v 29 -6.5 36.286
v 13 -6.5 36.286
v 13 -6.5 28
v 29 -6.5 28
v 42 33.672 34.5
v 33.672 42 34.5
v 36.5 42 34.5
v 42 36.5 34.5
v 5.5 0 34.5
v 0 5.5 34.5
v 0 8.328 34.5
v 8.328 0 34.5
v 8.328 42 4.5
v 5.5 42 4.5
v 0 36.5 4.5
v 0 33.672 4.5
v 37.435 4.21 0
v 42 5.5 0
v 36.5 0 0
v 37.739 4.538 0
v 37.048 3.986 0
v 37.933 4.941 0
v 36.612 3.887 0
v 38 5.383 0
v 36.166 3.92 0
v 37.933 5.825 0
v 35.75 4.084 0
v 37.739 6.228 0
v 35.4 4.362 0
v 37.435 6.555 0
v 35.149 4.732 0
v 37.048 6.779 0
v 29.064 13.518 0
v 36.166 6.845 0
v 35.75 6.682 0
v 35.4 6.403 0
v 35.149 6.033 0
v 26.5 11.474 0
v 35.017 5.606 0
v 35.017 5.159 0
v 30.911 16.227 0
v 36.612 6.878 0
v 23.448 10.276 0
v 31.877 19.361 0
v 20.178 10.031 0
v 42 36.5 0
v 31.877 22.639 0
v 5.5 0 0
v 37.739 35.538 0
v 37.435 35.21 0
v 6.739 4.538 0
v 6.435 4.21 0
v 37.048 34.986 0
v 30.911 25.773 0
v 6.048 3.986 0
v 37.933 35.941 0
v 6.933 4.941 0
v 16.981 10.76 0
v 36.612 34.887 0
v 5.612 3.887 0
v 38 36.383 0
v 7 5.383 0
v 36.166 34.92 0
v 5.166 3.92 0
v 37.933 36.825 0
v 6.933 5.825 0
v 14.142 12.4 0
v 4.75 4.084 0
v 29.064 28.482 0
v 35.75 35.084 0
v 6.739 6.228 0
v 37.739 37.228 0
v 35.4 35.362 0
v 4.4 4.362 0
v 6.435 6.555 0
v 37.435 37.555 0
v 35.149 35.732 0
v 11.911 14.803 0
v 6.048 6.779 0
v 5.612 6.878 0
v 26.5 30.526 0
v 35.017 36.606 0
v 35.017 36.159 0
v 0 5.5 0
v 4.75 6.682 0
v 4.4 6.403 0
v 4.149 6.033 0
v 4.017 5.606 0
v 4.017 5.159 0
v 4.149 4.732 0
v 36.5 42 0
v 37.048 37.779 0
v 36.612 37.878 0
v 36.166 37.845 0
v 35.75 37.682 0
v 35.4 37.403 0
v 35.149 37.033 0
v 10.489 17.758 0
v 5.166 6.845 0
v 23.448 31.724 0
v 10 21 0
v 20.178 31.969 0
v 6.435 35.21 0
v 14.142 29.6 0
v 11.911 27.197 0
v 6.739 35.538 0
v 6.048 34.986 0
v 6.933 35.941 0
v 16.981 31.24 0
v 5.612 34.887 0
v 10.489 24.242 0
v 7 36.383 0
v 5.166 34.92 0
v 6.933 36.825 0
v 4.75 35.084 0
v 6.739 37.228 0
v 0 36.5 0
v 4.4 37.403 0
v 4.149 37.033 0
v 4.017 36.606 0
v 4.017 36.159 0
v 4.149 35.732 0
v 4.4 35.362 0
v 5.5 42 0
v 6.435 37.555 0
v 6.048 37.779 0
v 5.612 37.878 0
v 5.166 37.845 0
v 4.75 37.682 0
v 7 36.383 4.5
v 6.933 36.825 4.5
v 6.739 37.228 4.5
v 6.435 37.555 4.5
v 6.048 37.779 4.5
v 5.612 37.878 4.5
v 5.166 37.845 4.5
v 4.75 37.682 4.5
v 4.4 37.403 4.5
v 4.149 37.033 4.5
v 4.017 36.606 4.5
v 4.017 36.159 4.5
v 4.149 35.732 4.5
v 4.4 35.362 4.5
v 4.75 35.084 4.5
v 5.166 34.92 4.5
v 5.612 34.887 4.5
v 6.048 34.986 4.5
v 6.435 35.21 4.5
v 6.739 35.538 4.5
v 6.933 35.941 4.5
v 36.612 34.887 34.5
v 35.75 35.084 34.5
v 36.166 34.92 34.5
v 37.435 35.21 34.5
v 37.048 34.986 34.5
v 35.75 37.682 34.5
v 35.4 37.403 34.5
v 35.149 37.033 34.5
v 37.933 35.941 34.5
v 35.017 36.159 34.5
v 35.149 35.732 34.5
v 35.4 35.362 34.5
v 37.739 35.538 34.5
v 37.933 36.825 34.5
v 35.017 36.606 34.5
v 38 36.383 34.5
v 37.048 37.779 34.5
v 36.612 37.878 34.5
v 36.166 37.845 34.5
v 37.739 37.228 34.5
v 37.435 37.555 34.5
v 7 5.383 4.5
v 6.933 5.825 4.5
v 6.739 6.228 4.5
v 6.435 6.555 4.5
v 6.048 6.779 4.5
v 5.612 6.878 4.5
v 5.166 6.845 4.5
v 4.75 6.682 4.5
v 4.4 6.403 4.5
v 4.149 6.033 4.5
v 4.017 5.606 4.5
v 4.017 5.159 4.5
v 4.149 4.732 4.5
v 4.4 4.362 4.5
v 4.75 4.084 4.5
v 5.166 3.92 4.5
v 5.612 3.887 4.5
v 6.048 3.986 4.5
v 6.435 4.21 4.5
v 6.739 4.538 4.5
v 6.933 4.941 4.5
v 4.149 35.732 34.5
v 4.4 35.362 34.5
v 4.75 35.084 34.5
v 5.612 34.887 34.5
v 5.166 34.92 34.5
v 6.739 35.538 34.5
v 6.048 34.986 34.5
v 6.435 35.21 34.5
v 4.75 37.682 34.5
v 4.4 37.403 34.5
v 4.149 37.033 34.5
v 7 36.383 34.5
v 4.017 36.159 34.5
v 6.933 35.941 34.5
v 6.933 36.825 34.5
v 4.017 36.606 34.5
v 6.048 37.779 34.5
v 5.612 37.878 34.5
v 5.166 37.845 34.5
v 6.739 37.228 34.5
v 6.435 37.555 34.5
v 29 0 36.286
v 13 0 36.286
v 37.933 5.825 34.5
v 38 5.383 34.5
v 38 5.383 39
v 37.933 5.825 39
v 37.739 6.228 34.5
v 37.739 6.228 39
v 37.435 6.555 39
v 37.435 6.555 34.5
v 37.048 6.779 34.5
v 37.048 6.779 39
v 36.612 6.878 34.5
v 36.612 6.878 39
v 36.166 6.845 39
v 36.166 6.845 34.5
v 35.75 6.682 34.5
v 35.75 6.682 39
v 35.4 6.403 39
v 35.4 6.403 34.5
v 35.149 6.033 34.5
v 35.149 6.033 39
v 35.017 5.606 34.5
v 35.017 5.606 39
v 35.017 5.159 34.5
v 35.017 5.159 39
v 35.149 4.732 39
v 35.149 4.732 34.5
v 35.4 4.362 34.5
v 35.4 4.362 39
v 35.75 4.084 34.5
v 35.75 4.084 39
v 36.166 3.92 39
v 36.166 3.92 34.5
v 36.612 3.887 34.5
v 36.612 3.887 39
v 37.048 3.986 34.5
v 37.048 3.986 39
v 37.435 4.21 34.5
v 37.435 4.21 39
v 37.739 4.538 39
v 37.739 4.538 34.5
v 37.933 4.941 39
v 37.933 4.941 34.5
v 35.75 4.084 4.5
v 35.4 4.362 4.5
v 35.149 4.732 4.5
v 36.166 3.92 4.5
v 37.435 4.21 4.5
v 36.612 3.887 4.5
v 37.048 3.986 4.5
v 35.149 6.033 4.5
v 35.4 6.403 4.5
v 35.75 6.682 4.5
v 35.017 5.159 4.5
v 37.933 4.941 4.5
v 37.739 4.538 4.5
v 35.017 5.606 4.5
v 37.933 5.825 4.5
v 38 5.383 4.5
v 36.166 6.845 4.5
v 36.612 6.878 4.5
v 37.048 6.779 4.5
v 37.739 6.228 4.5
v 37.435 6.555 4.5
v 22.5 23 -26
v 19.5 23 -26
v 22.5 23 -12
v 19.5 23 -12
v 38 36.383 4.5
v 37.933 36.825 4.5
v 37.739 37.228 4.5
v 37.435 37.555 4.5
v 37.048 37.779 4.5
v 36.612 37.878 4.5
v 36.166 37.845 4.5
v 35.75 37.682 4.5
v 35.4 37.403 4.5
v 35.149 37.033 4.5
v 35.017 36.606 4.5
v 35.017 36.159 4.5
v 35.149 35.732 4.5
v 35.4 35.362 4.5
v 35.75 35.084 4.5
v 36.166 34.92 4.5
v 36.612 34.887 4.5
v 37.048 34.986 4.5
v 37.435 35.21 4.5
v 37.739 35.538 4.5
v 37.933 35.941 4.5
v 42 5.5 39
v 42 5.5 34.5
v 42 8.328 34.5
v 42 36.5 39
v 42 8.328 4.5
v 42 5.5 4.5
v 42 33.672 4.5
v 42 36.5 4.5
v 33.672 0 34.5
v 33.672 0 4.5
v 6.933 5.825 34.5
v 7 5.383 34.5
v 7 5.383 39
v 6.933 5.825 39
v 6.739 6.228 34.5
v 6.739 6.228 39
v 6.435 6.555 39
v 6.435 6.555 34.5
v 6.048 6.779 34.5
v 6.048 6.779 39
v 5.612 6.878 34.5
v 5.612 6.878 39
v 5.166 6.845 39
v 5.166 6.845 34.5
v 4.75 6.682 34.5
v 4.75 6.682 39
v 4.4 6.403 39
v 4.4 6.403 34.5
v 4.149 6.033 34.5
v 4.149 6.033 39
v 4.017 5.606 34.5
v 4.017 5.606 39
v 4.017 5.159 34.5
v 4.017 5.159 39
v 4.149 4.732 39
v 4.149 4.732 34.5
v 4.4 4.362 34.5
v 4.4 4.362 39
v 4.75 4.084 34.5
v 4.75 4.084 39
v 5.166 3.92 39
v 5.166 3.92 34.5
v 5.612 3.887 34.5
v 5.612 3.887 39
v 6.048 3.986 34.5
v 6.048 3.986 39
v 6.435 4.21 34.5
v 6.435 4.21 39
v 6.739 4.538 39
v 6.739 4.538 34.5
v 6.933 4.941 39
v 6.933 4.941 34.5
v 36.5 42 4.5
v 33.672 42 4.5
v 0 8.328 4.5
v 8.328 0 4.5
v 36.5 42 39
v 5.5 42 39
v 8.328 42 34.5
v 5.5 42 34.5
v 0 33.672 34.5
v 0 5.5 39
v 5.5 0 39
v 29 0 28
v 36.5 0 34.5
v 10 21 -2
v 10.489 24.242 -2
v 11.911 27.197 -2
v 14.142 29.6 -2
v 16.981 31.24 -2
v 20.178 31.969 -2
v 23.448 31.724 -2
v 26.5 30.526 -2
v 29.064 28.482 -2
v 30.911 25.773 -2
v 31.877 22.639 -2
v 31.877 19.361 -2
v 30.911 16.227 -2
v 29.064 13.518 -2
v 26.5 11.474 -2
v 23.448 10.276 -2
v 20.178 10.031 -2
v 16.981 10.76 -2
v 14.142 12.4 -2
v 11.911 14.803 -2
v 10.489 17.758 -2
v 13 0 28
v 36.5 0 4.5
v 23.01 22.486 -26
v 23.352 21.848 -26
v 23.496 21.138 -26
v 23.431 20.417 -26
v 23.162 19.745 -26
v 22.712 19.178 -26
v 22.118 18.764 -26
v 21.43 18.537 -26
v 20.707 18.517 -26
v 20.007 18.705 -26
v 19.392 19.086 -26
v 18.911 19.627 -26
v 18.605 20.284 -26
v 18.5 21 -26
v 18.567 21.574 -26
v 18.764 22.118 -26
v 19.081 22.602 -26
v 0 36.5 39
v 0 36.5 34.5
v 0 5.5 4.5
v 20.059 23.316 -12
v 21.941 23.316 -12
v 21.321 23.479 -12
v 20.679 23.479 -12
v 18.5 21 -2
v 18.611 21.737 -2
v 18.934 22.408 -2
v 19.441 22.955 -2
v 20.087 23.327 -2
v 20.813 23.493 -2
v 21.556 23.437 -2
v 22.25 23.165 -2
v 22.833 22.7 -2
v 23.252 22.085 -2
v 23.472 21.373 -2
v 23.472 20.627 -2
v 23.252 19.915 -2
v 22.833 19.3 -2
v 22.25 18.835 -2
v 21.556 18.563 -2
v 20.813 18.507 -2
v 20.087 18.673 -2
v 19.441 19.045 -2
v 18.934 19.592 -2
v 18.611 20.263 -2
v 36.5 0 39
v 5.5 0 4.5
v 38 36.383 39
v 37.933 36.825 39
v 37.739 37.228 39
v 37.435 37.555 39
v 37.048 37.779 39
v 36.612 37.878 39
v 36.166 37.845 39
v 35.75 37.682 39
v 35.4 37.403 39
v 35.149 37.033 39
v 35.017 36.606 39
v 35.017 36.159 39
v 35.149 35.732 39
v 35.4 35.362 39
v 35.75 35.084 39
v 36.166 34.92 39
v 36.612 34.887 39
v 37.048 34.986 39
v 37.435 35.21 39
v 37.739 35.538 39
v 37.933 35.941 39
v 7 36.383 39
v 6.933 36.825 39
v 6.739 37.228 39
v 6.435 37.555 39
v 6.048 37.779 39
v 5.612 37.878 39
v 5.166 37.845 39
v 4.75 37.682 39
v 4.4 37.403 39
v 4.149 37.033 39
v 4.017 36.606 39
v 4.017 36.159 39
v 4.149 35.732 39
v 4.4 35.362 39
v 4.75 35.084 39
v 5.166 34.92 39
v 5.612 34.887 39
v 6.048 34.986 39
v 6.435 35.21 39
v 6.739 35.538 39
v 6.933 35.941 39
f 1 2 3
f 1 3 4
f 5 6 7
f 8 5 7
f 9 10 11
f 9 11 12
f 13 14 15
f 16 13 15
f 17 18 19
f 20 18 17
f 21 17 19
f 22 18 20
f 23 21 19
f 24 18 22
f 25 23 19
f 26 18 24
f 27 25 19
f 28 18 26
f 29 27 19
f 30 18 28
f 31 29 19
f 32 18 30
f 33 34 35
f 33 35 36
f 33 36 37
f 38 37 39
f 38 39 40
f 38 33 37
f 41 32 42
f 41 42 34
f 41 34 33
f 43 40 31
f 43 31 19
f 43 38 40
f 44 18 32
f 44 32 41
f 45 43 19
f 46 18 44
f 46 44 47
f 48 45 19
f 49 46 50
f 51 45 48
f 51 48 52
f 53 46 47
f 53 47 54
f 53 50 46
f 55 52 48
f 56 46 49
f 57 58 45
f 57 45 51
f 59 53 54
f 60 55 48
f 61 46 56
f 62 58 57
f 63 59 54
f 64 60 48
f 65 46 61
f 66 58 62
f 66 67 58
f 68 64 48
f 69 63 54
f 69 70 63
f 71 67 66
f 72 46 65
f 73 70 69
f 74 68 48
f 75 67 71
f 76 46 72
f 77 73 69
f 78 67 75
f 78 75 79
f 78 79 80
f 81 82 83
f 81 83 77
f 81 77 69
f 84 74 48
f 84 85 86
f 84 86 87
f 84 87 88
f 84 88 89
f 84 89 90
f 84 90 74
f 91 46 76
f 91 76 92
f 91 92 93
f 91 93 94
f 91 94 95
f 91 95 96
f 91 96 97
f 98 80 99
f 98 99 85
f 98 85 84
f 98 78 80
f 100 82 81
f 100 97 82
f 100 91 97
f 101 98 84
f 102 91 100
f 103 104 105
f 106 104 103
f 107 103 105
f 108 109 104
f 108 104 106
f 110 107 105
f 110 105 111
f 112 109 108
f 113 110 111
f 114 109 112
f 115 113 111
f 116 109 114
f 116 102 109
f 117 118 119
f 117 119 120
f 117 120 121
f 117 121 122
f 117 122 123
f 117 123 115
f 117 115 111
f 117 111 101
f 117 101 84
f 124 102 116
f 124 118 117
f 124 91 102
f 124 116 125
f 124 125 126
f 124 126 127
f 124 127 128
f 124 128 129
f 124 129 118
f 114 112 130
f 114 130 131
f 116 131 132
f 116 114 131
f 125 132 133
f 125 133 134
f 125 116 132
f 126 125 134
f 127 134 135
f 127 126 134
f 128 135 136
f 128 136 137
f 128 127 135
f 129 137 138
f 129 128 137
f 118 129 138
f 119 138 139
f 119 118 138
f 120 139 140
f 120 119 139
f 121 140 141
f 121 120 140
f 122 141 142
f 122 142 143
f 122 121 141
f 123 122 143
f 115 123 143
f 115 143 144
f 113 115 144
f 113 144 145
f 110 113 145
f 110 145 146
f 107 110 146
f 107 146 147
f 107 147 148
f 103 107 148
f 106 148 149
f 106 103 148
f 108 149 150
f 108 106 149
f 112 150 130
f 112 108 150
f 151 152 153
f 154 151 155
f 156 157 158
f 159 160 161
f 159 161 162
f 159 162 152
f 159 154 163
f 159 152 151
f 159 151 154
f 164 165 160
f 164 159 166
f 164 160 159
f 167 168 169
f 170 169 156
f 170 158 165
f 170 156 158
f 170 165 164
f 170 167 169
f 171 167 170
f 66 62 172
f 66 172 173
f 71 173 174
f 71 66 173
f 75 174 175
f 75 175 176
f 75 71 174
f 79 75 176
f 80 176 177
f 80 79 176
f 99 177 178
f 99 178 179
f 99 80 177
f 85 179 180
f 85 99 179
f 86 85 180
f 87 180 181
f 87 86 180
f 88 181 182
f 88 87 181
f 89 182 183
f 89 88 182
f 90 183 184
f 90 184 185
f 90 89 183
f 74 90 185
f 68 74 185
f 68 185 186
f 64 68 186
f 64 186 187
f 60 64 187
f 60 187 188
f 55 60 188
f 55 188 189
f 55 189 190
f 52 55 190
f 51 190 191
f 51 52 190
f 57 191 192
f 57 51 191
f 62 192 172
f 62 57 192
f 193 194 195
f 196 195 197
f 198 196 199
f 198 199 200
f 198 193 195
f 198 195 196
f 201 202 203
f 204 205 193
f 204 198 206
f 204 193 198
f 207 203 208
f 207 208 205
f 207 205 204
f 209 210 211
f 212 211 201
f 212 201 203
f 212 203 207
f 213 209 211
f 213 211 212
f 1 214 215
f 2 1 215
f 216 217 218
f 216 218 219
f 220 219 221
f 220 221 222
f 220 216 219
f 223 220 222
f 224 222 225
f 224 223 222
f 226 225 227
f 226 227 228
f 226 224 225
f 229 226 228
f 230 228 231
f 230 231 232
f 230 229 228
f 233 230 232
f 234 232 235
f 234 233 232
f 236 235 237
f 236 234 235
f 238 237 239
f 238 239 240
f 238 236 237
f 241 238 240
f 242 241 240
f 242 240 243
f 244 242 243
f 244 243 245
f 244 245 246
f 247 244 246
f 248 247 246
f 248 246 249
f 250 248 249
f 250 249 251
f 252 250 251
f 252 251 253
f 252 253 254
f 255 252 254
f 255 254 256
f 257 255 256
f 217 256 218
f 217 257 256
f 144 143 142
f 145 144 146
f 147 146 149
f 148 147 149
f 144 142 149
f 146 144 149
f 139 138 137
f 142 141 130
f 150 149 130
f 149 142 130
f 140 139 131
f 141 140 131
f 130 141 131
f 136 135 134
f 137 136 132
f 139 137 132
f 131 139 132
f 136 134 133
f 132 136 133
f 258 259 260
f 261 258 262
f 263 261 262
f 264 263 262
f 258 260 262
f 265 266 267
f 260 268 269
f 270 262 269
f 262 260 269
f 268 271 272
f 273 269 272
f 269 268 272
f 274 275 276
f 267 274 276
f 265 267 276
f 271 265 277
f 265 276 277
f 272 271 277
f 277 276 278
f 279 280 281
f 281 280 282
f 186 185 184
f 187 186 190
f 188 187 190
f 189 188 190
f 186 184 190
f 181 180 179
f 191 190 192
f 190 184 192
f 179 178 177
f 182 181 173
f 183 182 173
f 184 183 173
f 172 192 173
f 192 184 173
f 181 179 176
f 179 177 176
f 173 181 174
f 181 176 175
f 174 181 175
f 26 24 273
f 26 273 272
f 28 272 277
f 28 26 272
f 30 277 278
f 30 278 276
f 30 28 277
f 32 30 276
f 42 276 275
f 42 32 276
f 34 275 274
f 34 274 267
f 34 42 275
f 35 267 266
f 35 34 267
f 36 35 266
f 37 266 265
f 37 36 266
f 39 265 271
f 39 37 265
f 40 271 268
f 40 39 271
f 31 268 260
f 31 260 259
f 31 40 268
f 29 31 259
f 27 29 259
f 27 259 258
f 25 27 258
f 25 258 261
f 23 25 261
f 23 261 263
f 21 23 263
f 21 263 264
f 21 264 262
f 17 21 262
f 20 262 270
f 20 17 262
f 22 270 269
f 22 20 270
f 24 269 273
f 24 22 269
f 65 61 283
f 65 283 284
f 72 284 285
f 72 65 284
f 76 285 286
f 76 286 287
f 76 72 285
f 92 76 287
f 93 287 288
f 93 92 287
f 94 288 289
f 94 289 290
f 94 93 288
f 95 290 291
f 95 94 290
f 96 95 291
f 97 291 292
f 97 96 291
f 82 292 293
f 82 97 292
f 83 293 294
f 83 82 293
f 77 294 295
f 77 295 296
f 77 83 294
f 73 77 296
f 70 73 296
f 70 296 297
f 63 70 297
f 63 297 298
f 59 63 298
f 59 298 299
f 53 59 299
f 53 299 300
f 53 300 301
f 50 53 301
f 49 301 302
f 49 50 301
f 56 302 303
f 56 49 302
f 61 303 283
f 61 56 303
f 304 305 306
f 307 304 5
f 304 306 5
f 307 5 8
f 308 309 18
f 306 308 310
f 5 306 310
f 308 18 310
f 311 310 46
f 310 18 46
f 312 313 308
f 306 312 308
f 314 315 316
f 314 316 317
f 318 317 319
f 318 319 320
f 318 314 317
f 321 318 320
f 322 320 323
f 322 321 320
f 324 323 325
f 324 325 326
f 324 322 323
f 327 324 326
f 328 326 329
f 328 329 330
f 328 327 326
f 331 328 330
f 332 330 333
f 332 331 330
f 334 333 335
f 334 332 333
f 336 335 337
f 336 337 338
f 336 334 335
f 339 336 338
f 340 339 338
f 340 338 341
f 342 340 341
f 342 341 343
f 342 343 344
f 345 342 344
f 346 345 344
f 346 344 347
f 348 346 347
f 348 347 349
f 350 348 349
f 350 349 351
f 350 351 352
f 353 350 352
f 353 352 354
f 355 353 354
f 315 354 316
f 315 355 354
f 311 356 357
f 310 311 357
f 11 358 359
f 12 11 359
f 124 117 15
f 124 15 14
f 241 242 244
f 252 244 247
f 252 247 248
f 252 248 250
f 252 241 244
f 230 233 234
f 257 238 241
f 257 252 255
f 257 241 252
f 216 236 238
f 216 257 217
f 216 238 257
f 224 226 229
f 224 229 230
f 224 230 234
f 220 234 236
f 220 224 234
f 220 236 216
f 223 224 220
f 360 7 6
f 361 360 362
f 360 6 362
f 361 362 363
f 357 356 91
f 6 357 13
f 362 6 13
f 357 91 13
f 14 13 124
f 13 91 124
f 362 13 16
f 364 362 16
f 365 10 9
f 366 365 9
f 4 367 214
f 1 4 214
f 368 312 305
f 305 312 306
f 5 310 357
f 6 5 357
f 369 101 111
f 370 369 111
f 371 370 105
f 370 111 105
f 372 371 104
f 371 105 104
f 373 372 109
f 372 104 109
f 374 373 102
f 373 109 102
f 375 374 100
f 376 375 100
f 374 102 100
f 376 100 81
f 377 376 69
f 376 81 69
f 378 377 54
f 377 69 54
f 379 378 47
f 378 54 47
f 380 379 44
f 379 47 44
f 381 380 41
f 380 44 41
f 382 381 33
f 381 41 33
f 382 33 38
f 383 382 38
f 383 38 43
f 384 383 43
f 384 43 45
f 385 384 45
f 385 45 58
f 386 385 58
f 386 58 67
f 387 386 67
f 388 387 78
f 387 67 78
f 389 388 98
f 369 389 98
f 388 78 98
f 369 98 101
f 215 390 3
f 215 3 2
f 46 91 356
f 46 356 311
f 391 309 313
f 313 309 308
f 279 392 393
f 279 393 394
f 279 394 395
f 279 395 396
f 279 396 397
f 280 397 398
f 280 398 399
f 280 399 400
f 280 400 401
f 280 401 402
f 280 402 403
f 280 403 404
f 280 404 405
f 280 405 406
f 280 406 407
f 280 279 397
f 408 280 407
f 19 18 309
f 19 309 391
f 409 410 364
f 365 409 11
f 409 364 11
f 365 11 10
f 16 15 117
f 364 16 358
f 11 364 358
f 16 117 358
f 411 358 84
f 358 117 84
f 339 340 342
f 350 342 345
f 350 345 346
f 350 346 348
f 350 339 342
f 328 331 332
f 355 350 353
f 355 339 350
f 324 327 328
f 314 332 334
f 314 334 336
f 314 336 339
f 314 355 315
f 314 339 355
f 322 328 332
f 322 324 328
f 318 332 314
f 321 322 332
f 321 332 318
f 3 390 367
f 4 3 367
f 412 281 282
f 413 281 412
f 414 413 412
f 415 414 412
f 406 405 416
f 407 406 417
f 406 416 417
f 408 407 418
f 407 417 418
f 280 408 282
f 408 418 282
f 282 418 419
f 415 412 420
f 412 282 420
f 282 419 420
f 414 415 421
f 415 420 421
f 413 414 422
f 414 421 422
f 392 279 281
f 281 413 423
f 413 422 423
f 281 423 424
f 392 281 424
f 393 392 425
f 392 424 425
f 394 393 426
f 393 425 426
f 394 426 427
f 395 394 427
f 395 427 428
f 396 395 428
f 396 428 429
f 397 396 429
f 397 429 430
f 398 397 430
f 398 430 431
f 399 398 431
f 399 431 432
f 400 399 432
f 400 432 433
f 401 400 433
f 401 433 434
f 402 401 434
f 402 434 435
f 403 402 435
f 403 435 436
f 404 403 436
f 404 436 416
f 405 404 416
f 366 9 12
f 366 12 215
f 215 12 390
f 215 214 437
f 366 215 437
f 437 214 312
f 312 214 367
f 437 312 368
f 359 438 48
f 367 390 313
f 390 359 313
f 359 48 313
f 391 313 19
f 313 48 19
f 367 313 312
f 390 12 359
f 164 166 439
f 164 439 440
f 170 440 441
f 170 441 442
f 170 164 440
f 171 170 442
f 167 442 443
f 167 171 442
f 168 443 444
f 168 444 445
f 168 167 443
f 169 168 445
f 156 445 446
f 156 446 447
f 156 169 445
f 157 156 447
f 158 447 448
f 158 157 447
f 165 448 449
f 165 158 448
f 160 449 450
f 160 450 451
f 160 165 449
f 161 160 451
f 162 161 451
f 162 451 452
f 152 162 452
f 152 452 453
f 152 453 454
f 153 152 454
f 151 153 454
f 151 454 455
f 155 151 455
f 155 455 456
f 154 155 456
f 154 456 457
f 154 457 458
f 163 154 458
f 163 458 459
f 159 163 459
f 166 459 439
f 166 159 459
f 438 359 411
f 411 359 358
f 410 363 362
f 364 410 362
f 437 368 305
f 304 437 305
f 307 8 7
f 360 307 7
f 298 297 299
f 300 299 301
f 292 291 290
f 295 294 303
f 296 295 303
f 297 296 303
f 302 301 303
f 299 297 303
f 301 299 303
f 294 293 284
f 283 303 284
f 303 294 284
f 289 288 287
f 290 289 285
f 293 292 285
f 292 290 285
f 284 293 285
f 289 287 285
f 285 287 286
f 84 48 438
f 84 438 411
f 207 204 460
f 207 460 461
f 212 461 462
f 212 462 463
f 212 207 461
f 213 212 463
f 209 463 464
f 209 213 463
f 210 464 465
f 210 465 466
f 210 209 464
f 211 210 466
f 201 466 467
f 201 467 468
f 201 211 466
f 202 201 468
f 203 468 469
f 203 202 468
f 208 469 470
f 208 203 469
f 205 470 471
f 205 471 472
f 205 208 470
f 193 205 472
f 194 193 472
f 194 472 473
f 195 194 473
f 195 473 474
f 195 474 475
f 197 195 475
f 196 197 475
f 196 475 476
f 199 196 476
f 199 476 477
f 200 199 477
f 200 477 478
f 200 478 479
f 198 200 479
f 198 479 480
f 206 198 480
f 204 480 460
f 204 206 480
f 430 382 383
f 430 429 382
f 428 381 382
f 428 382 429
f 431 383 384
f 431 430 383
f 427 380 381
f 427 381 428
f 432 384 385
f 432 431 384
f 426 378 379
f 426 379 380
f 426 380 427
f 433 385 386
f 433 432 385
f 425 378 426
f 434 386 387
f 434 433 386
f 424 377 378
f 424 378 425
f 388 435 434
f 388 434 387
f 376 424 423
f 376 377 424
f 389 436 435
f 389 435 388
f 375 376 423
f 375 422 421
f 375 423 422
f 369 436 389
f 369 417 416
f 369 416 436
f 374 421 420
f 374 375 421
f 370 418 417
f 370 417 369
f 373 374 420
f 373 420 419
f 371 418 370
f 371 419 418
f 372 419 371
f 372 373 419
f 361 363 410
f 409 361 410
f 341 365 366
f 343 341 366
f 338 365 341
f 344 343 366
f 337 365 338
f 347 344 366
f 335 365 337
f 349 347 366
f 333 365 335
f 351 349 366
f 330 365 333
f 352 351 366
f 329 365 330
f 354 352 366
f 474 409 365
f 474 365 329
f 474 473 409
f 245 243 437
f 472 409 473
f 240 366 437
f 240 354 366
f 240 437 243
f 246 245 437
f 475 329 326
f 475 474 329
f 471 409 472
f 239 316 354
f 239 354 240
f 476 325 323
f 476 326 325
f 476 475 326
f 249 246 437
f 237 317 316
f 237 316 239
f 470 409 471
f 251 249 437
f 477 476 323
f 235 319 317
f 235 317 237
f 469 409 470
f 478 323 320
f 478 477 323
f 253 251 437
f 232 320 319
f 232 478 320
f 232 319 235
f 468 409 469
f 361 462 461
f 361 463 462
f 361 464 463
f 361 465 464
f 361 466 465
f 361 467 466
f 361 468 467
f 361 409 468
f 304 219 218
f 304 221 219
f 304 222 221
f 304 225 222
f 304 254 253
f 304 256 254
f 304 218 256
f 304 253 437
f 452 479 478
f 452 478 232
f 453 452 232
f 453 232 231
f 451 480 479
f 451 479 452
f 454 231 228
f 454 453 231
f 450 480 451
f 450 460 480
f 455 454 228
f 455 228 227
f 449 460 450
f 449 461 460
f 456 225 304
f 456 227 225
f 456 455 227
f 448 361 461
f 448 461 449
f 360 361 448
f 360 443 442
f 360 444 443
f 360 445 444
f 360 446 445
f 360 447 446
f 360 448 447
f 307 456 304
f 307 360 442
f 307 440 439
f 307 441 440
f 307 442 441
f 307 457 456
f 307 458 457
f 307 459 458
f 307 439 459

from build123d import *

# Parameters (mm, degrees)
SKETCH1_R           = 1.5
BOSS_EXTRUDE1_DEPTH = 4.5
BOSS_EXTRUDE2_DEPTH = 30
SKETCH3_R           = 1.5
BOSS_EXTRUDE3_DEPTH = 4.5
SKETCH5_R           = 11
BOSS_EXTRUDE4_DEPTH = 2
SKETCH6_R           = 2.5
BOSS_EXTRUDE5_DEPTH = 24
SKETCH7_W           = 14
SKETCH7_H           = 0.5
CUT_EXTRUDE2_DEPTH  = 72.056315694
SKETCH8_W           = 8
SKETCH8_H           = 8.285823085
BOSS_EXTRUDE6_DEPTH = 6.5


with BuildPart() as part:
    # Sketch1 → Boss-Extrude1 (new body)
    with BuildSketch(Plane.XY):
        Polygon((0, 36.5), (5.5, 42), (36.5, 42), (42, 36.5), (42, 5.5), (36.5, 0), (5.5, 0), (0, 5.5), align=None)
        with Locations((5.5, 36.382666597)):
            Circle(SKETCH1_R, mode=Mode.SUBTRACT)
        with Locations((36.5, 36.382666597)):
            Circle(SKETCH1_R, mode=Mode.SUBTRACT)
        with Locations((36.5, 5.382666597)):
            Circle(SKETCH1_R, mode=Mode.SUBTRACT)
        with Locations((5.5, 5.382666597)):
            Circle(SKETCH1_R, mode=Mode.SUBTRACT)
    extrude(amount=BOSS_EXTRUDE1_DEPTH)

    # Sketch2 → Boss-Extrude2 (add)
    with BuildSketch(Plane.XY.offset(4.5)):
        Polygon((8.328427125, 42), (0, 33.671572875), (0, 8.328427125), (8.328427125, 0), (33.671572875, 0), (42, 8.328427125), (42, 33.671572875), (33.671572875, 42), align=None)
    extrude(amount=BOSS_EXTRUDE2_DEPTH)

    # Sketch3 → Boss-Extrude3 (add)
    with BuildSketch(Plane.XY.offset(34.5)):
        Polygon((36.5, 42), (5.5, 42), (0, 36.5), (0, 5.5), (5.5, 0), (36.5, 0), (42, 5.5), (42, 36.5), align=None)
        with Locations((5.5, 5.382666597)):
            Circle(SKETCH3_R, mode=Mode.SUBTRACT)
        with Locations((36.5, 5.382666597)):
            Circle(SKETCH3_R, mode=Mode.SUBTRACT)
        with Locations((5.5, 36.382666597)):
            Circle(SKETCH3_R, mode=Mode.SUBTRACT)
        with Locations((36.5, 36.382666597)):
            Circle(SKETCH3_R, mode=Mode.SUBTRACT)
    extrude(amount=BOSS_EXTRUDE3_DEPTH)

    # Sketch5 → Boss-Extrude4 (add)
    with BuildSketch(Plane(origin=(0, 0, 0), x_dir=(-1, 0, 0), z_dir=(0, 0, -1))):
        with Locations((-21, 21)):
            Circle(SKETCH5_R)
    extrude(amount=BOSS_EXTRUDE4_DEPTH)

    # Sketch6 → Boss-Extrude5 (add)
    with BuildSketch(Plane(origin=(0, 0, -2), x_dir=(-1, 0, 0), z_dir=(0, 0, -1))):
        with Locations((-21, 21)):
            Circle(SKETCH6_R)
    extrude(amount=BOSS_EXTRUDE5_DEPTH)

    # Sketch7 → Cut-Extrude2 (cut, through all)
    with BuildSketch(Plane.ZY):
        with Locations((-19, 23.25)):
            Rectangle(SKETCH7_W, SKETCH7_H)
    extrude(amount=-CUT_EXTRUDE2_DEPTH, mode=Mode.SUBTRACT)

    # Sketch8 → Boss-Extrude6 (add)
    with BuildSketch(Plane.XZ):
        with Locations((17, 32.142911543)):
            Rectangle(SKETCH8_W, SKETCH8_H)
        with Locations((25, 32.142911543)):
            Rectangle(SKETCH8_W, SKETCH8_H)
    extrude(amount=BOSS_EXTRUDE6_DEPTH)


solid = part.part
